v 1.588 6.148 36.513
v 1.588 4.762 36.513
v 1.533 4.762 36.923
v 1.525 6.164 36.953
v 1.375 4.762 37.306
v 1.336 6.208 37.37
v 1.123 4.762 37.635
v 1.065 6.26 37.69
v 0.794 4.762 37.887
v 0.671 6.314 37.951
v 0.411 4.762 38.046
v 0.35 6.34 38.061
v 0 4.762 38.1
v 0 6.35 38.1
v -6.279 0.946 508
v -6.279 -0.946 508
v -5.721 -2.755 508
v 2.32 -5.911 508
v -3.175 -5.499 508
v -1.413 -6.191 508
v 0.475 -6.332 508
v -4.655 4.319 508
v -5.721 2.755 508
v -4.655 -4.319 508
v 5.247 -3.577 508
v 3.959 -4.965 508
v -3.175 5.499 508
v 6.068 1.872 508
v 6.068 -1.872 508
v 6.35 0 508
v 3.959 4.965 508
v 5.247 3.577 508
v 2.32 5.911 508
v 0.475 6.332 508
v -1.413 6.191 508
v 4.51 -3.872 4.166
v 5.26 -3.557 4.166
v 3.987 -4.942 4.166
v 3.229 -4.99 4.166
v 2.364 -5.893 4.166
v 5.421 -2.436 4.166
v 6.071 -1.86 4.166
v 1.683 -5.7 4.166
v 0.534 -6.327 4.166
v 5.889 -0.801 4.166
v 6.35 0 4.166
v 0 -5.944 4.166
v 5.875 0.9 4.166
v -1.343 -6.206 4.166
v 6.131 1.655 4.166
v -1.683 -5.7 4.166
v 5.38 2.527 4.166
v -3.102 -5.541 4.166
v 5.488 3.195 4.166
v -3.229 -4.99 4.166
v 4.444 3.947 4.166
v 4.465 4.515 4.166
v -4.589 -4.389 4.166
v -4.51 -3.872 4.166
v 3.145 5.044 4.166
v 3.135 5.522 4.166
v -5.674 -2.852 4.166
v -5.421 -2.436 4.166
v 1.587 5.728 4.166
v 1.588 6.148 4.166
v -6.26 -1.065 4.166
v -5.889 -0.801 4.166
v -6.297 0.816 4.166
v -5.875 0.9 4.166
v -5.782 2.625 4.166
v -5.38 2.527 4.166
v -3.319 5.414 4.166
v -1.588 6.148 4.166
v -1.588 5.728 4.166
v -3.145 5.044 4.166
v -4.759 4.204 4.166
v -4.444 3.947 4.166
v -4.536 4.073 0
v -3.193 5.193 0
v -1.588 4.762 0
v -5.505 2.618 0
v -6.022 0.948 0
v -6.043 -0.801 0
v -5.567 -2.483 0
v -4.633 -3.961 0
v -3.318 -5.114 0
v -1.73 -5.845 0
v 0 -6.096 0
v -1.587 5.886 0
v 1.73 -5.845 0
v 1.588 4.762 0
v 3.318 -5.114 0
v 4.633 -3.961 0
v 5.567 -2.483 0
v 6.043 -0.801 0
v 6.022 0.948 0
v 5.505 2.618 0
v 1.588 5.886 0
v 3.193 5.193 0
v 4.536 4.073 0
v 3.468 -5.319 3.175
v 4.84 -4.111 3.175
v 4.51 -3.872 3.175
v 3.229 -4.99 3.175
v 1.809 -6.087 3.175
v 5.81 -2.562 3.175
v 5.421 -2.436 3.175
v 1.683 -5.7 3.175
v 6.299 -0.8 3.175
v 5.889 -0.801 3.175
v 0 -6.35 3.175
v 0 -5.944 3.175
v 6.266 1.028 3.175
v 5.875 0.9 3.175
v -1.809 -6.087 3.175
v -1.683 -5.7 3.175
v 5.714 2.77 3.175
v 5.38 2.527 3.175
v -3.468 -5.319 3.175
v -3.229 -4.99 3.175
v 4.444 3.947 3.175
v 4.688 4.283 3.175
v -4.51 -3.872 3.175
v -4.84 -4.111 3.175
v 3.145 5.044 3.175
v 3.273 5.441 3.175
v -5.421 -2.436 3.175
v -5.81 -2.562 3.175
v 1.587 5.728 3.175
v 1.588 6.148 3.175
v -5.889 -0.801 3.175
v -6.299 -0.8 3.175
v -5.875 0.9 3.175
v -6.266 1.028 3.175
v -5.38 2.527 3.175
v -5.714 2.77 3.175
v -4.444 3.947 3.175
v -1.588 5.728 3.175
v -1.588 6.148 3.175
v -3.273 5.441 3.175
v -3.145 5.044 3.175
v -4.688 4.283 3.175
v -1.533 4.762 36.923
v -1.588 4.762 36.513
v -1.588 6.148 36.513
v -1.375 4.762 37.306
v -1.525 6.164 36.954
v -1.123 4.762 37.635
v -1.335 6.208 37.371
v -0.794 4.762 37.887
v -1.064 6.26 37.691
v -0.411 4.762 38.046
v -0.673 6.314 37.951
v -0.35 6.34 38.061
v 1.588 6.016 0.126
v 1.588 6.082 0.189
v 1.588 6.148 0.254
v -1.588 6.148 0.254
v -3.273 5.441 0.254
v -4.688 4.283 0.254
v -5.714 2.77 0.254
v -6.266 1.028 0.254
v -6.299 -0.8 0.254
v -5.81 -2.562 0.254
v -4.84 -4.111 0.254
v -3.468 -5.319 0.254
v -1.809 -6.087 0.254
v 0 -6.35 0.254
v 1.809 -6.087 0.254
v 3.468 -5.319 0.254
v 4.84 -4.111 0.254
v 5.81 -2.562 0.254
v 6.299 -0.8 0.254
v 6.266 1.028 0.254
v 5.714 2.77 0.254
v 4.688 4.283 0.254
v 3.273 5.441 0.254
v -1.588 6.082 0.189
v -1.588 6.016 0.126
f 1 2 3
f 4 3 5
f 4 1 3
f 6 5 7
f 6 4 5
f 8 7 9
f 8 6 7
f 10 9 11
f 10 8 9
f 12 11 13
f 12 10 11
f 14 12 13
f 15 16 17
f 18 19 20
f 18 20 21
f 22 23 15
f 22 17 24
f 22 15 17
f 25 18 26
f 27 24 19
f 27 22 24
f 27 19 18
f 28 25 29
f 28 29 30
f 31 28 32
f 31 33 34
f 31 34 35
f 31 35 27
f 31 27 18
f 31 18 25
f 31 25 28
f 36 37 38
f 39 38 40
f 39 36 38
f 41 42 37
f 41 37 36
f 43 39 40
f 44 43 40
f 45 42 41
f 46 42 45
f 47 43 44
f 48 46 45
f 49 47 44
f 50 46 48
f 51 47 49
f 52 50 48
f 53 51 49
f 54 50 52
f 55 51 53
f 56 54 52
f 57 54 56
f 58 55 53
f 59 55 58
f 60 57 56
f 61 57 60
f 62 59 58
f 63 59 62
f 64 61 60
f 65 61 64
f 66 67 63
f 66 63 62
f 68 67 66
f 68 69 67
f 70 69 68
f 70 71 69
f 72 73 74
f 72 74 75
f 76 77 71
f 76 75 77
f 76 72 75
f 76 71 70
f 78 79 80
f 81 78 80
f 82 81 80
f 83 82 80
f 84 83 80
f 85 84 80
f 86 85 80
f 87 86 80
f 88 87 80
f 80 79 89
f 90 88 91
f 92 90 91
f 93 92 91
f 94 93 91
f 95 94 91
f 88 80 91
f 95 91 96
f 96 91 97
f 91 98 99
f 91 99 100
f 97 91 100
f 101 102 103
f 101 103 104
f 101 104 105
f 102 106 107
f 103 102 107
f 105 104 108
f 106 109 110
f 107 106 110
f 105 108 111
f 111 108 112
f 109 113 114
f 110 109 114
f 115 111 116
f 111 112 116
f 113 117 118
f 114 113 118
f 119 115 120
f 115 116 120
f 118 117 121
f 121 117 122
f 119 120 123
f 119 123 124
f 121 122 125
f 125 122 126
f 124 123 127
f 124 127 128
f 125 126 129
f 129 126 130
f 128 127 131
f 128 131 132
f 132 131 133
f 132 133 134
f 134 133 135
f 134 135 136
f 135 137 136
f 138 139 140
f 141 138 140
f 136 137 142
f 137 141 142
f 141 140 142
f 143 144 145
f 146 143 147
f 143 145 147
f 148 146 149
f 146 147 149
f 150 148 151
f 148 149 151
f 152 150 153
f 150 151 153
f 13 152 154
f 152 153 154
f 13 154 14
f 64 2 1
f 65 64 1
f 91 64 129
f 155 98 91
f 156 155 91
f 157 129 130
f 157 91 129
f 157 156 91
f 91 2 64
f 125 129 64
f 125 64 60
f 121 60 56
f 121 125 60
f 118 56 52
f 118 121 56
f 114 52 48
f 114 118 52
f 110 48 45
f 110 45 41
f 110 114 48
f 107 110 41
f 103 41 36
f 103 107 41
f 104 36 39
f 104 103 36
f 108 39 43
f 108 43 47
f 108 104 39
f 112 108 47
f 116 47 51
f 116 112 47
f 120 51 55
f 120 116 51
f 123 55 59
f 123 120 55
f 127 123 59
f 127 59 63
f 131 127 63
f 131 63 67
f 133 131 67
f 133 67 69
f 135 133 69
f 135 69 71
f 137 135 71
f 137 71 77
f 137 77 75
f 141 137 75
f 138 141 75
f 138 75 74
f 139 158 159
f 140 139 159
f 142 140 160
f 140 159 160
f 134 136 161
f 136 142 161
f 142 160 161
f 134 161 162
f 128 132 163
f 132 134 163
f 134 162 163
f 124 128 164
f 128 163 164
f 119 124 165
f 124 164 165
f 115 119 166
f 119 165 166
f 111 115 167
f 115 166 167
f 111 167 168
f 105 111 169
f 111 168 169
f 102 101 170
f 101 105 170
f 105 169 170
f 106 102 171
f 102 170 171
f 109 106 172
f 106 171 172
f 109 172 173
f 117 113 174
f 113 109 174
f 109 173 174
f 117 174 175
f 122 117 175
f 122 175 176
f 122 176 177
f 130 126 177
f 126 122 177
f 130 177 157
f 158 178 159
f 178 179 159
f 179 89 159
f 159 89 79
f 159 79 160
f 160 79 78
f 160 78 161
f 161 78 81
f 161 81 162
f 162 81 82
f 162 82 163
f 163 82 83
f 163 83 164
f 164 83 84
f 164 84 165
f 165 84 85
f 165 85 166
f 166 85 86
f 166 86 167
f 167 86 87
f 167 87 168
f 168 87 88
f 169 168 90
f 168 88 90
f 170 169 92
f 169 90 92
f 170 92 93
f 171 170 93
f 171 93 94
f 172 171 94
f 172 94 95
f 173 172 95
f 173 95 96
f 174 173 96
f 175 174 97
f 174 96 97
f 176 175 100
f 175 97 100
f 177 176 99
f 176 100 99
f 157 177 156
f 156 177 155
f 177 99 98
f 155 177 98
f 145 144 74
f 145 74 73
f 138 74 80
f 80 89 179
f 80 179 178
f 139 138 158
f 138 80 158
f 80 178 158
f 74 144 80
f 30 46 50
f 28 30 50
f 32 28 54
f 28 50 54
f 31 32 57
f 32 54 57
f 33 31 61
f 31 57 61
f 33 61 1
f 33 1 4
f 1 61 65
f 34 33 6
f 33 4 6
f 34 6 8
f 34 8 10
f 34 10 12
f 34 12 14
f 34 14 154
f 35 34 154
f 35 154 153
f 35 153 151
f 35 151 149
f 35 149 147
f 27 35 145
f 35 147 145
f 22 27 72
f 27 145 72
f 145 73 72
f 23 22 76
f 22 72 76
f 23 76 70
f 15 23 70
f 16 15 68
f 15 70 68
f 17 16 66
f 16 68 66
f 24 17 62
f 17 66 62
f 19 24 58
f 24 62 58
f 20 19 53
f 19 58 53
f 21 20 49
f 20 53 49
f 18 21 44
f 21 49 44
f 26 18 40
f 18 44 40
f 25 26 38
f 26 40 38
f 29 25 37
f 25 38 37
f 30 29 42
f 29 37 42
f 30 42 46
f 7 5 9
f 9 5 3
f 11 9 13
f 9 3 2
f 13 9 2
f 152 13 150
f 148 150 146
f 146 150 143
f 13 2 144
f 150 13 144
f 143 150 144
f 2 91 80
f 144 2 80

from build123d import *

# Parameters (mm, degrees)
SKETCH1_R           = 6.35
BOSS_EXTRUDE1_DEPTH = 508
SKETCH2_W           = 3.175
SKETCH2_H           = 3.175
CUT_EXTRUDE1_DEPTH  = 38.1
SKETCH3_R           = 9.19467987
SKETCH3_R_2         = 5.9436
CUT_EXTRUDE2_DEPTH  = 0.9906
CHAMFER1_SIZE       = 0.254
FILLET1_R           = 1.5875


with BuildPart() as part:
    # Sketch1 → Boss-Extrude1 (new body)
    with BuildSketch(Plane.XY):
        Circle(SKETCH1_R)
    extrude(amount=BOSS_EXTRUDE1_DEPTH)

    # Sketch2 → Cut-Extrude1 (cut)
    with BuildSketch(Plane(origin=(0, 0, 0), x_dir=(-1, 0, 0), z_dir=(0, 0, -1))):
        with Locations((0, 6.35)):
            Rectangle(SKETCH2_W, SKETCH2_H)
    extrude(amount=-CUT_EXTRUDE1_DEPTH, mode=Mode.SUBTRACT)

    # Sketch3 → Cut-Extrude2 (cut)
    with BuildSketch(Plane(origin=(0, 0, 3.175), x_dir=(-1, 0, 0), z_dir=(0, 0, -1))):
        Circle(SKETCH3_R)
        Circle(SKETCH3_R_2, mode=Mode.SUBTRACT)
    extrude(amount=-CUT_EXTRUDE2_DEPTH, mode=Mode.SUBTRACT)

    # Chamfer1
    chamfer1_edges = [part.edges().sort_by_distance(p)[0] for p in [
        (0, -6.35, 0),
    ]]
    chamfer(chamfer1_edges, length=CHAMFER1_SIZE)

    # Fillet1
    fillet1_edges = [part.edges().sort_by_distance(p)[0] for p in [
        (-1.5875, 5.455430531, 38.1),
        (1.5875, 5.455430531, 38.1),
    ]]
    fillet(fillet1_edges, radius=FILLET1_R - 0.0001)  # a hair under: the kernel refuses the full size


solid = part.part
